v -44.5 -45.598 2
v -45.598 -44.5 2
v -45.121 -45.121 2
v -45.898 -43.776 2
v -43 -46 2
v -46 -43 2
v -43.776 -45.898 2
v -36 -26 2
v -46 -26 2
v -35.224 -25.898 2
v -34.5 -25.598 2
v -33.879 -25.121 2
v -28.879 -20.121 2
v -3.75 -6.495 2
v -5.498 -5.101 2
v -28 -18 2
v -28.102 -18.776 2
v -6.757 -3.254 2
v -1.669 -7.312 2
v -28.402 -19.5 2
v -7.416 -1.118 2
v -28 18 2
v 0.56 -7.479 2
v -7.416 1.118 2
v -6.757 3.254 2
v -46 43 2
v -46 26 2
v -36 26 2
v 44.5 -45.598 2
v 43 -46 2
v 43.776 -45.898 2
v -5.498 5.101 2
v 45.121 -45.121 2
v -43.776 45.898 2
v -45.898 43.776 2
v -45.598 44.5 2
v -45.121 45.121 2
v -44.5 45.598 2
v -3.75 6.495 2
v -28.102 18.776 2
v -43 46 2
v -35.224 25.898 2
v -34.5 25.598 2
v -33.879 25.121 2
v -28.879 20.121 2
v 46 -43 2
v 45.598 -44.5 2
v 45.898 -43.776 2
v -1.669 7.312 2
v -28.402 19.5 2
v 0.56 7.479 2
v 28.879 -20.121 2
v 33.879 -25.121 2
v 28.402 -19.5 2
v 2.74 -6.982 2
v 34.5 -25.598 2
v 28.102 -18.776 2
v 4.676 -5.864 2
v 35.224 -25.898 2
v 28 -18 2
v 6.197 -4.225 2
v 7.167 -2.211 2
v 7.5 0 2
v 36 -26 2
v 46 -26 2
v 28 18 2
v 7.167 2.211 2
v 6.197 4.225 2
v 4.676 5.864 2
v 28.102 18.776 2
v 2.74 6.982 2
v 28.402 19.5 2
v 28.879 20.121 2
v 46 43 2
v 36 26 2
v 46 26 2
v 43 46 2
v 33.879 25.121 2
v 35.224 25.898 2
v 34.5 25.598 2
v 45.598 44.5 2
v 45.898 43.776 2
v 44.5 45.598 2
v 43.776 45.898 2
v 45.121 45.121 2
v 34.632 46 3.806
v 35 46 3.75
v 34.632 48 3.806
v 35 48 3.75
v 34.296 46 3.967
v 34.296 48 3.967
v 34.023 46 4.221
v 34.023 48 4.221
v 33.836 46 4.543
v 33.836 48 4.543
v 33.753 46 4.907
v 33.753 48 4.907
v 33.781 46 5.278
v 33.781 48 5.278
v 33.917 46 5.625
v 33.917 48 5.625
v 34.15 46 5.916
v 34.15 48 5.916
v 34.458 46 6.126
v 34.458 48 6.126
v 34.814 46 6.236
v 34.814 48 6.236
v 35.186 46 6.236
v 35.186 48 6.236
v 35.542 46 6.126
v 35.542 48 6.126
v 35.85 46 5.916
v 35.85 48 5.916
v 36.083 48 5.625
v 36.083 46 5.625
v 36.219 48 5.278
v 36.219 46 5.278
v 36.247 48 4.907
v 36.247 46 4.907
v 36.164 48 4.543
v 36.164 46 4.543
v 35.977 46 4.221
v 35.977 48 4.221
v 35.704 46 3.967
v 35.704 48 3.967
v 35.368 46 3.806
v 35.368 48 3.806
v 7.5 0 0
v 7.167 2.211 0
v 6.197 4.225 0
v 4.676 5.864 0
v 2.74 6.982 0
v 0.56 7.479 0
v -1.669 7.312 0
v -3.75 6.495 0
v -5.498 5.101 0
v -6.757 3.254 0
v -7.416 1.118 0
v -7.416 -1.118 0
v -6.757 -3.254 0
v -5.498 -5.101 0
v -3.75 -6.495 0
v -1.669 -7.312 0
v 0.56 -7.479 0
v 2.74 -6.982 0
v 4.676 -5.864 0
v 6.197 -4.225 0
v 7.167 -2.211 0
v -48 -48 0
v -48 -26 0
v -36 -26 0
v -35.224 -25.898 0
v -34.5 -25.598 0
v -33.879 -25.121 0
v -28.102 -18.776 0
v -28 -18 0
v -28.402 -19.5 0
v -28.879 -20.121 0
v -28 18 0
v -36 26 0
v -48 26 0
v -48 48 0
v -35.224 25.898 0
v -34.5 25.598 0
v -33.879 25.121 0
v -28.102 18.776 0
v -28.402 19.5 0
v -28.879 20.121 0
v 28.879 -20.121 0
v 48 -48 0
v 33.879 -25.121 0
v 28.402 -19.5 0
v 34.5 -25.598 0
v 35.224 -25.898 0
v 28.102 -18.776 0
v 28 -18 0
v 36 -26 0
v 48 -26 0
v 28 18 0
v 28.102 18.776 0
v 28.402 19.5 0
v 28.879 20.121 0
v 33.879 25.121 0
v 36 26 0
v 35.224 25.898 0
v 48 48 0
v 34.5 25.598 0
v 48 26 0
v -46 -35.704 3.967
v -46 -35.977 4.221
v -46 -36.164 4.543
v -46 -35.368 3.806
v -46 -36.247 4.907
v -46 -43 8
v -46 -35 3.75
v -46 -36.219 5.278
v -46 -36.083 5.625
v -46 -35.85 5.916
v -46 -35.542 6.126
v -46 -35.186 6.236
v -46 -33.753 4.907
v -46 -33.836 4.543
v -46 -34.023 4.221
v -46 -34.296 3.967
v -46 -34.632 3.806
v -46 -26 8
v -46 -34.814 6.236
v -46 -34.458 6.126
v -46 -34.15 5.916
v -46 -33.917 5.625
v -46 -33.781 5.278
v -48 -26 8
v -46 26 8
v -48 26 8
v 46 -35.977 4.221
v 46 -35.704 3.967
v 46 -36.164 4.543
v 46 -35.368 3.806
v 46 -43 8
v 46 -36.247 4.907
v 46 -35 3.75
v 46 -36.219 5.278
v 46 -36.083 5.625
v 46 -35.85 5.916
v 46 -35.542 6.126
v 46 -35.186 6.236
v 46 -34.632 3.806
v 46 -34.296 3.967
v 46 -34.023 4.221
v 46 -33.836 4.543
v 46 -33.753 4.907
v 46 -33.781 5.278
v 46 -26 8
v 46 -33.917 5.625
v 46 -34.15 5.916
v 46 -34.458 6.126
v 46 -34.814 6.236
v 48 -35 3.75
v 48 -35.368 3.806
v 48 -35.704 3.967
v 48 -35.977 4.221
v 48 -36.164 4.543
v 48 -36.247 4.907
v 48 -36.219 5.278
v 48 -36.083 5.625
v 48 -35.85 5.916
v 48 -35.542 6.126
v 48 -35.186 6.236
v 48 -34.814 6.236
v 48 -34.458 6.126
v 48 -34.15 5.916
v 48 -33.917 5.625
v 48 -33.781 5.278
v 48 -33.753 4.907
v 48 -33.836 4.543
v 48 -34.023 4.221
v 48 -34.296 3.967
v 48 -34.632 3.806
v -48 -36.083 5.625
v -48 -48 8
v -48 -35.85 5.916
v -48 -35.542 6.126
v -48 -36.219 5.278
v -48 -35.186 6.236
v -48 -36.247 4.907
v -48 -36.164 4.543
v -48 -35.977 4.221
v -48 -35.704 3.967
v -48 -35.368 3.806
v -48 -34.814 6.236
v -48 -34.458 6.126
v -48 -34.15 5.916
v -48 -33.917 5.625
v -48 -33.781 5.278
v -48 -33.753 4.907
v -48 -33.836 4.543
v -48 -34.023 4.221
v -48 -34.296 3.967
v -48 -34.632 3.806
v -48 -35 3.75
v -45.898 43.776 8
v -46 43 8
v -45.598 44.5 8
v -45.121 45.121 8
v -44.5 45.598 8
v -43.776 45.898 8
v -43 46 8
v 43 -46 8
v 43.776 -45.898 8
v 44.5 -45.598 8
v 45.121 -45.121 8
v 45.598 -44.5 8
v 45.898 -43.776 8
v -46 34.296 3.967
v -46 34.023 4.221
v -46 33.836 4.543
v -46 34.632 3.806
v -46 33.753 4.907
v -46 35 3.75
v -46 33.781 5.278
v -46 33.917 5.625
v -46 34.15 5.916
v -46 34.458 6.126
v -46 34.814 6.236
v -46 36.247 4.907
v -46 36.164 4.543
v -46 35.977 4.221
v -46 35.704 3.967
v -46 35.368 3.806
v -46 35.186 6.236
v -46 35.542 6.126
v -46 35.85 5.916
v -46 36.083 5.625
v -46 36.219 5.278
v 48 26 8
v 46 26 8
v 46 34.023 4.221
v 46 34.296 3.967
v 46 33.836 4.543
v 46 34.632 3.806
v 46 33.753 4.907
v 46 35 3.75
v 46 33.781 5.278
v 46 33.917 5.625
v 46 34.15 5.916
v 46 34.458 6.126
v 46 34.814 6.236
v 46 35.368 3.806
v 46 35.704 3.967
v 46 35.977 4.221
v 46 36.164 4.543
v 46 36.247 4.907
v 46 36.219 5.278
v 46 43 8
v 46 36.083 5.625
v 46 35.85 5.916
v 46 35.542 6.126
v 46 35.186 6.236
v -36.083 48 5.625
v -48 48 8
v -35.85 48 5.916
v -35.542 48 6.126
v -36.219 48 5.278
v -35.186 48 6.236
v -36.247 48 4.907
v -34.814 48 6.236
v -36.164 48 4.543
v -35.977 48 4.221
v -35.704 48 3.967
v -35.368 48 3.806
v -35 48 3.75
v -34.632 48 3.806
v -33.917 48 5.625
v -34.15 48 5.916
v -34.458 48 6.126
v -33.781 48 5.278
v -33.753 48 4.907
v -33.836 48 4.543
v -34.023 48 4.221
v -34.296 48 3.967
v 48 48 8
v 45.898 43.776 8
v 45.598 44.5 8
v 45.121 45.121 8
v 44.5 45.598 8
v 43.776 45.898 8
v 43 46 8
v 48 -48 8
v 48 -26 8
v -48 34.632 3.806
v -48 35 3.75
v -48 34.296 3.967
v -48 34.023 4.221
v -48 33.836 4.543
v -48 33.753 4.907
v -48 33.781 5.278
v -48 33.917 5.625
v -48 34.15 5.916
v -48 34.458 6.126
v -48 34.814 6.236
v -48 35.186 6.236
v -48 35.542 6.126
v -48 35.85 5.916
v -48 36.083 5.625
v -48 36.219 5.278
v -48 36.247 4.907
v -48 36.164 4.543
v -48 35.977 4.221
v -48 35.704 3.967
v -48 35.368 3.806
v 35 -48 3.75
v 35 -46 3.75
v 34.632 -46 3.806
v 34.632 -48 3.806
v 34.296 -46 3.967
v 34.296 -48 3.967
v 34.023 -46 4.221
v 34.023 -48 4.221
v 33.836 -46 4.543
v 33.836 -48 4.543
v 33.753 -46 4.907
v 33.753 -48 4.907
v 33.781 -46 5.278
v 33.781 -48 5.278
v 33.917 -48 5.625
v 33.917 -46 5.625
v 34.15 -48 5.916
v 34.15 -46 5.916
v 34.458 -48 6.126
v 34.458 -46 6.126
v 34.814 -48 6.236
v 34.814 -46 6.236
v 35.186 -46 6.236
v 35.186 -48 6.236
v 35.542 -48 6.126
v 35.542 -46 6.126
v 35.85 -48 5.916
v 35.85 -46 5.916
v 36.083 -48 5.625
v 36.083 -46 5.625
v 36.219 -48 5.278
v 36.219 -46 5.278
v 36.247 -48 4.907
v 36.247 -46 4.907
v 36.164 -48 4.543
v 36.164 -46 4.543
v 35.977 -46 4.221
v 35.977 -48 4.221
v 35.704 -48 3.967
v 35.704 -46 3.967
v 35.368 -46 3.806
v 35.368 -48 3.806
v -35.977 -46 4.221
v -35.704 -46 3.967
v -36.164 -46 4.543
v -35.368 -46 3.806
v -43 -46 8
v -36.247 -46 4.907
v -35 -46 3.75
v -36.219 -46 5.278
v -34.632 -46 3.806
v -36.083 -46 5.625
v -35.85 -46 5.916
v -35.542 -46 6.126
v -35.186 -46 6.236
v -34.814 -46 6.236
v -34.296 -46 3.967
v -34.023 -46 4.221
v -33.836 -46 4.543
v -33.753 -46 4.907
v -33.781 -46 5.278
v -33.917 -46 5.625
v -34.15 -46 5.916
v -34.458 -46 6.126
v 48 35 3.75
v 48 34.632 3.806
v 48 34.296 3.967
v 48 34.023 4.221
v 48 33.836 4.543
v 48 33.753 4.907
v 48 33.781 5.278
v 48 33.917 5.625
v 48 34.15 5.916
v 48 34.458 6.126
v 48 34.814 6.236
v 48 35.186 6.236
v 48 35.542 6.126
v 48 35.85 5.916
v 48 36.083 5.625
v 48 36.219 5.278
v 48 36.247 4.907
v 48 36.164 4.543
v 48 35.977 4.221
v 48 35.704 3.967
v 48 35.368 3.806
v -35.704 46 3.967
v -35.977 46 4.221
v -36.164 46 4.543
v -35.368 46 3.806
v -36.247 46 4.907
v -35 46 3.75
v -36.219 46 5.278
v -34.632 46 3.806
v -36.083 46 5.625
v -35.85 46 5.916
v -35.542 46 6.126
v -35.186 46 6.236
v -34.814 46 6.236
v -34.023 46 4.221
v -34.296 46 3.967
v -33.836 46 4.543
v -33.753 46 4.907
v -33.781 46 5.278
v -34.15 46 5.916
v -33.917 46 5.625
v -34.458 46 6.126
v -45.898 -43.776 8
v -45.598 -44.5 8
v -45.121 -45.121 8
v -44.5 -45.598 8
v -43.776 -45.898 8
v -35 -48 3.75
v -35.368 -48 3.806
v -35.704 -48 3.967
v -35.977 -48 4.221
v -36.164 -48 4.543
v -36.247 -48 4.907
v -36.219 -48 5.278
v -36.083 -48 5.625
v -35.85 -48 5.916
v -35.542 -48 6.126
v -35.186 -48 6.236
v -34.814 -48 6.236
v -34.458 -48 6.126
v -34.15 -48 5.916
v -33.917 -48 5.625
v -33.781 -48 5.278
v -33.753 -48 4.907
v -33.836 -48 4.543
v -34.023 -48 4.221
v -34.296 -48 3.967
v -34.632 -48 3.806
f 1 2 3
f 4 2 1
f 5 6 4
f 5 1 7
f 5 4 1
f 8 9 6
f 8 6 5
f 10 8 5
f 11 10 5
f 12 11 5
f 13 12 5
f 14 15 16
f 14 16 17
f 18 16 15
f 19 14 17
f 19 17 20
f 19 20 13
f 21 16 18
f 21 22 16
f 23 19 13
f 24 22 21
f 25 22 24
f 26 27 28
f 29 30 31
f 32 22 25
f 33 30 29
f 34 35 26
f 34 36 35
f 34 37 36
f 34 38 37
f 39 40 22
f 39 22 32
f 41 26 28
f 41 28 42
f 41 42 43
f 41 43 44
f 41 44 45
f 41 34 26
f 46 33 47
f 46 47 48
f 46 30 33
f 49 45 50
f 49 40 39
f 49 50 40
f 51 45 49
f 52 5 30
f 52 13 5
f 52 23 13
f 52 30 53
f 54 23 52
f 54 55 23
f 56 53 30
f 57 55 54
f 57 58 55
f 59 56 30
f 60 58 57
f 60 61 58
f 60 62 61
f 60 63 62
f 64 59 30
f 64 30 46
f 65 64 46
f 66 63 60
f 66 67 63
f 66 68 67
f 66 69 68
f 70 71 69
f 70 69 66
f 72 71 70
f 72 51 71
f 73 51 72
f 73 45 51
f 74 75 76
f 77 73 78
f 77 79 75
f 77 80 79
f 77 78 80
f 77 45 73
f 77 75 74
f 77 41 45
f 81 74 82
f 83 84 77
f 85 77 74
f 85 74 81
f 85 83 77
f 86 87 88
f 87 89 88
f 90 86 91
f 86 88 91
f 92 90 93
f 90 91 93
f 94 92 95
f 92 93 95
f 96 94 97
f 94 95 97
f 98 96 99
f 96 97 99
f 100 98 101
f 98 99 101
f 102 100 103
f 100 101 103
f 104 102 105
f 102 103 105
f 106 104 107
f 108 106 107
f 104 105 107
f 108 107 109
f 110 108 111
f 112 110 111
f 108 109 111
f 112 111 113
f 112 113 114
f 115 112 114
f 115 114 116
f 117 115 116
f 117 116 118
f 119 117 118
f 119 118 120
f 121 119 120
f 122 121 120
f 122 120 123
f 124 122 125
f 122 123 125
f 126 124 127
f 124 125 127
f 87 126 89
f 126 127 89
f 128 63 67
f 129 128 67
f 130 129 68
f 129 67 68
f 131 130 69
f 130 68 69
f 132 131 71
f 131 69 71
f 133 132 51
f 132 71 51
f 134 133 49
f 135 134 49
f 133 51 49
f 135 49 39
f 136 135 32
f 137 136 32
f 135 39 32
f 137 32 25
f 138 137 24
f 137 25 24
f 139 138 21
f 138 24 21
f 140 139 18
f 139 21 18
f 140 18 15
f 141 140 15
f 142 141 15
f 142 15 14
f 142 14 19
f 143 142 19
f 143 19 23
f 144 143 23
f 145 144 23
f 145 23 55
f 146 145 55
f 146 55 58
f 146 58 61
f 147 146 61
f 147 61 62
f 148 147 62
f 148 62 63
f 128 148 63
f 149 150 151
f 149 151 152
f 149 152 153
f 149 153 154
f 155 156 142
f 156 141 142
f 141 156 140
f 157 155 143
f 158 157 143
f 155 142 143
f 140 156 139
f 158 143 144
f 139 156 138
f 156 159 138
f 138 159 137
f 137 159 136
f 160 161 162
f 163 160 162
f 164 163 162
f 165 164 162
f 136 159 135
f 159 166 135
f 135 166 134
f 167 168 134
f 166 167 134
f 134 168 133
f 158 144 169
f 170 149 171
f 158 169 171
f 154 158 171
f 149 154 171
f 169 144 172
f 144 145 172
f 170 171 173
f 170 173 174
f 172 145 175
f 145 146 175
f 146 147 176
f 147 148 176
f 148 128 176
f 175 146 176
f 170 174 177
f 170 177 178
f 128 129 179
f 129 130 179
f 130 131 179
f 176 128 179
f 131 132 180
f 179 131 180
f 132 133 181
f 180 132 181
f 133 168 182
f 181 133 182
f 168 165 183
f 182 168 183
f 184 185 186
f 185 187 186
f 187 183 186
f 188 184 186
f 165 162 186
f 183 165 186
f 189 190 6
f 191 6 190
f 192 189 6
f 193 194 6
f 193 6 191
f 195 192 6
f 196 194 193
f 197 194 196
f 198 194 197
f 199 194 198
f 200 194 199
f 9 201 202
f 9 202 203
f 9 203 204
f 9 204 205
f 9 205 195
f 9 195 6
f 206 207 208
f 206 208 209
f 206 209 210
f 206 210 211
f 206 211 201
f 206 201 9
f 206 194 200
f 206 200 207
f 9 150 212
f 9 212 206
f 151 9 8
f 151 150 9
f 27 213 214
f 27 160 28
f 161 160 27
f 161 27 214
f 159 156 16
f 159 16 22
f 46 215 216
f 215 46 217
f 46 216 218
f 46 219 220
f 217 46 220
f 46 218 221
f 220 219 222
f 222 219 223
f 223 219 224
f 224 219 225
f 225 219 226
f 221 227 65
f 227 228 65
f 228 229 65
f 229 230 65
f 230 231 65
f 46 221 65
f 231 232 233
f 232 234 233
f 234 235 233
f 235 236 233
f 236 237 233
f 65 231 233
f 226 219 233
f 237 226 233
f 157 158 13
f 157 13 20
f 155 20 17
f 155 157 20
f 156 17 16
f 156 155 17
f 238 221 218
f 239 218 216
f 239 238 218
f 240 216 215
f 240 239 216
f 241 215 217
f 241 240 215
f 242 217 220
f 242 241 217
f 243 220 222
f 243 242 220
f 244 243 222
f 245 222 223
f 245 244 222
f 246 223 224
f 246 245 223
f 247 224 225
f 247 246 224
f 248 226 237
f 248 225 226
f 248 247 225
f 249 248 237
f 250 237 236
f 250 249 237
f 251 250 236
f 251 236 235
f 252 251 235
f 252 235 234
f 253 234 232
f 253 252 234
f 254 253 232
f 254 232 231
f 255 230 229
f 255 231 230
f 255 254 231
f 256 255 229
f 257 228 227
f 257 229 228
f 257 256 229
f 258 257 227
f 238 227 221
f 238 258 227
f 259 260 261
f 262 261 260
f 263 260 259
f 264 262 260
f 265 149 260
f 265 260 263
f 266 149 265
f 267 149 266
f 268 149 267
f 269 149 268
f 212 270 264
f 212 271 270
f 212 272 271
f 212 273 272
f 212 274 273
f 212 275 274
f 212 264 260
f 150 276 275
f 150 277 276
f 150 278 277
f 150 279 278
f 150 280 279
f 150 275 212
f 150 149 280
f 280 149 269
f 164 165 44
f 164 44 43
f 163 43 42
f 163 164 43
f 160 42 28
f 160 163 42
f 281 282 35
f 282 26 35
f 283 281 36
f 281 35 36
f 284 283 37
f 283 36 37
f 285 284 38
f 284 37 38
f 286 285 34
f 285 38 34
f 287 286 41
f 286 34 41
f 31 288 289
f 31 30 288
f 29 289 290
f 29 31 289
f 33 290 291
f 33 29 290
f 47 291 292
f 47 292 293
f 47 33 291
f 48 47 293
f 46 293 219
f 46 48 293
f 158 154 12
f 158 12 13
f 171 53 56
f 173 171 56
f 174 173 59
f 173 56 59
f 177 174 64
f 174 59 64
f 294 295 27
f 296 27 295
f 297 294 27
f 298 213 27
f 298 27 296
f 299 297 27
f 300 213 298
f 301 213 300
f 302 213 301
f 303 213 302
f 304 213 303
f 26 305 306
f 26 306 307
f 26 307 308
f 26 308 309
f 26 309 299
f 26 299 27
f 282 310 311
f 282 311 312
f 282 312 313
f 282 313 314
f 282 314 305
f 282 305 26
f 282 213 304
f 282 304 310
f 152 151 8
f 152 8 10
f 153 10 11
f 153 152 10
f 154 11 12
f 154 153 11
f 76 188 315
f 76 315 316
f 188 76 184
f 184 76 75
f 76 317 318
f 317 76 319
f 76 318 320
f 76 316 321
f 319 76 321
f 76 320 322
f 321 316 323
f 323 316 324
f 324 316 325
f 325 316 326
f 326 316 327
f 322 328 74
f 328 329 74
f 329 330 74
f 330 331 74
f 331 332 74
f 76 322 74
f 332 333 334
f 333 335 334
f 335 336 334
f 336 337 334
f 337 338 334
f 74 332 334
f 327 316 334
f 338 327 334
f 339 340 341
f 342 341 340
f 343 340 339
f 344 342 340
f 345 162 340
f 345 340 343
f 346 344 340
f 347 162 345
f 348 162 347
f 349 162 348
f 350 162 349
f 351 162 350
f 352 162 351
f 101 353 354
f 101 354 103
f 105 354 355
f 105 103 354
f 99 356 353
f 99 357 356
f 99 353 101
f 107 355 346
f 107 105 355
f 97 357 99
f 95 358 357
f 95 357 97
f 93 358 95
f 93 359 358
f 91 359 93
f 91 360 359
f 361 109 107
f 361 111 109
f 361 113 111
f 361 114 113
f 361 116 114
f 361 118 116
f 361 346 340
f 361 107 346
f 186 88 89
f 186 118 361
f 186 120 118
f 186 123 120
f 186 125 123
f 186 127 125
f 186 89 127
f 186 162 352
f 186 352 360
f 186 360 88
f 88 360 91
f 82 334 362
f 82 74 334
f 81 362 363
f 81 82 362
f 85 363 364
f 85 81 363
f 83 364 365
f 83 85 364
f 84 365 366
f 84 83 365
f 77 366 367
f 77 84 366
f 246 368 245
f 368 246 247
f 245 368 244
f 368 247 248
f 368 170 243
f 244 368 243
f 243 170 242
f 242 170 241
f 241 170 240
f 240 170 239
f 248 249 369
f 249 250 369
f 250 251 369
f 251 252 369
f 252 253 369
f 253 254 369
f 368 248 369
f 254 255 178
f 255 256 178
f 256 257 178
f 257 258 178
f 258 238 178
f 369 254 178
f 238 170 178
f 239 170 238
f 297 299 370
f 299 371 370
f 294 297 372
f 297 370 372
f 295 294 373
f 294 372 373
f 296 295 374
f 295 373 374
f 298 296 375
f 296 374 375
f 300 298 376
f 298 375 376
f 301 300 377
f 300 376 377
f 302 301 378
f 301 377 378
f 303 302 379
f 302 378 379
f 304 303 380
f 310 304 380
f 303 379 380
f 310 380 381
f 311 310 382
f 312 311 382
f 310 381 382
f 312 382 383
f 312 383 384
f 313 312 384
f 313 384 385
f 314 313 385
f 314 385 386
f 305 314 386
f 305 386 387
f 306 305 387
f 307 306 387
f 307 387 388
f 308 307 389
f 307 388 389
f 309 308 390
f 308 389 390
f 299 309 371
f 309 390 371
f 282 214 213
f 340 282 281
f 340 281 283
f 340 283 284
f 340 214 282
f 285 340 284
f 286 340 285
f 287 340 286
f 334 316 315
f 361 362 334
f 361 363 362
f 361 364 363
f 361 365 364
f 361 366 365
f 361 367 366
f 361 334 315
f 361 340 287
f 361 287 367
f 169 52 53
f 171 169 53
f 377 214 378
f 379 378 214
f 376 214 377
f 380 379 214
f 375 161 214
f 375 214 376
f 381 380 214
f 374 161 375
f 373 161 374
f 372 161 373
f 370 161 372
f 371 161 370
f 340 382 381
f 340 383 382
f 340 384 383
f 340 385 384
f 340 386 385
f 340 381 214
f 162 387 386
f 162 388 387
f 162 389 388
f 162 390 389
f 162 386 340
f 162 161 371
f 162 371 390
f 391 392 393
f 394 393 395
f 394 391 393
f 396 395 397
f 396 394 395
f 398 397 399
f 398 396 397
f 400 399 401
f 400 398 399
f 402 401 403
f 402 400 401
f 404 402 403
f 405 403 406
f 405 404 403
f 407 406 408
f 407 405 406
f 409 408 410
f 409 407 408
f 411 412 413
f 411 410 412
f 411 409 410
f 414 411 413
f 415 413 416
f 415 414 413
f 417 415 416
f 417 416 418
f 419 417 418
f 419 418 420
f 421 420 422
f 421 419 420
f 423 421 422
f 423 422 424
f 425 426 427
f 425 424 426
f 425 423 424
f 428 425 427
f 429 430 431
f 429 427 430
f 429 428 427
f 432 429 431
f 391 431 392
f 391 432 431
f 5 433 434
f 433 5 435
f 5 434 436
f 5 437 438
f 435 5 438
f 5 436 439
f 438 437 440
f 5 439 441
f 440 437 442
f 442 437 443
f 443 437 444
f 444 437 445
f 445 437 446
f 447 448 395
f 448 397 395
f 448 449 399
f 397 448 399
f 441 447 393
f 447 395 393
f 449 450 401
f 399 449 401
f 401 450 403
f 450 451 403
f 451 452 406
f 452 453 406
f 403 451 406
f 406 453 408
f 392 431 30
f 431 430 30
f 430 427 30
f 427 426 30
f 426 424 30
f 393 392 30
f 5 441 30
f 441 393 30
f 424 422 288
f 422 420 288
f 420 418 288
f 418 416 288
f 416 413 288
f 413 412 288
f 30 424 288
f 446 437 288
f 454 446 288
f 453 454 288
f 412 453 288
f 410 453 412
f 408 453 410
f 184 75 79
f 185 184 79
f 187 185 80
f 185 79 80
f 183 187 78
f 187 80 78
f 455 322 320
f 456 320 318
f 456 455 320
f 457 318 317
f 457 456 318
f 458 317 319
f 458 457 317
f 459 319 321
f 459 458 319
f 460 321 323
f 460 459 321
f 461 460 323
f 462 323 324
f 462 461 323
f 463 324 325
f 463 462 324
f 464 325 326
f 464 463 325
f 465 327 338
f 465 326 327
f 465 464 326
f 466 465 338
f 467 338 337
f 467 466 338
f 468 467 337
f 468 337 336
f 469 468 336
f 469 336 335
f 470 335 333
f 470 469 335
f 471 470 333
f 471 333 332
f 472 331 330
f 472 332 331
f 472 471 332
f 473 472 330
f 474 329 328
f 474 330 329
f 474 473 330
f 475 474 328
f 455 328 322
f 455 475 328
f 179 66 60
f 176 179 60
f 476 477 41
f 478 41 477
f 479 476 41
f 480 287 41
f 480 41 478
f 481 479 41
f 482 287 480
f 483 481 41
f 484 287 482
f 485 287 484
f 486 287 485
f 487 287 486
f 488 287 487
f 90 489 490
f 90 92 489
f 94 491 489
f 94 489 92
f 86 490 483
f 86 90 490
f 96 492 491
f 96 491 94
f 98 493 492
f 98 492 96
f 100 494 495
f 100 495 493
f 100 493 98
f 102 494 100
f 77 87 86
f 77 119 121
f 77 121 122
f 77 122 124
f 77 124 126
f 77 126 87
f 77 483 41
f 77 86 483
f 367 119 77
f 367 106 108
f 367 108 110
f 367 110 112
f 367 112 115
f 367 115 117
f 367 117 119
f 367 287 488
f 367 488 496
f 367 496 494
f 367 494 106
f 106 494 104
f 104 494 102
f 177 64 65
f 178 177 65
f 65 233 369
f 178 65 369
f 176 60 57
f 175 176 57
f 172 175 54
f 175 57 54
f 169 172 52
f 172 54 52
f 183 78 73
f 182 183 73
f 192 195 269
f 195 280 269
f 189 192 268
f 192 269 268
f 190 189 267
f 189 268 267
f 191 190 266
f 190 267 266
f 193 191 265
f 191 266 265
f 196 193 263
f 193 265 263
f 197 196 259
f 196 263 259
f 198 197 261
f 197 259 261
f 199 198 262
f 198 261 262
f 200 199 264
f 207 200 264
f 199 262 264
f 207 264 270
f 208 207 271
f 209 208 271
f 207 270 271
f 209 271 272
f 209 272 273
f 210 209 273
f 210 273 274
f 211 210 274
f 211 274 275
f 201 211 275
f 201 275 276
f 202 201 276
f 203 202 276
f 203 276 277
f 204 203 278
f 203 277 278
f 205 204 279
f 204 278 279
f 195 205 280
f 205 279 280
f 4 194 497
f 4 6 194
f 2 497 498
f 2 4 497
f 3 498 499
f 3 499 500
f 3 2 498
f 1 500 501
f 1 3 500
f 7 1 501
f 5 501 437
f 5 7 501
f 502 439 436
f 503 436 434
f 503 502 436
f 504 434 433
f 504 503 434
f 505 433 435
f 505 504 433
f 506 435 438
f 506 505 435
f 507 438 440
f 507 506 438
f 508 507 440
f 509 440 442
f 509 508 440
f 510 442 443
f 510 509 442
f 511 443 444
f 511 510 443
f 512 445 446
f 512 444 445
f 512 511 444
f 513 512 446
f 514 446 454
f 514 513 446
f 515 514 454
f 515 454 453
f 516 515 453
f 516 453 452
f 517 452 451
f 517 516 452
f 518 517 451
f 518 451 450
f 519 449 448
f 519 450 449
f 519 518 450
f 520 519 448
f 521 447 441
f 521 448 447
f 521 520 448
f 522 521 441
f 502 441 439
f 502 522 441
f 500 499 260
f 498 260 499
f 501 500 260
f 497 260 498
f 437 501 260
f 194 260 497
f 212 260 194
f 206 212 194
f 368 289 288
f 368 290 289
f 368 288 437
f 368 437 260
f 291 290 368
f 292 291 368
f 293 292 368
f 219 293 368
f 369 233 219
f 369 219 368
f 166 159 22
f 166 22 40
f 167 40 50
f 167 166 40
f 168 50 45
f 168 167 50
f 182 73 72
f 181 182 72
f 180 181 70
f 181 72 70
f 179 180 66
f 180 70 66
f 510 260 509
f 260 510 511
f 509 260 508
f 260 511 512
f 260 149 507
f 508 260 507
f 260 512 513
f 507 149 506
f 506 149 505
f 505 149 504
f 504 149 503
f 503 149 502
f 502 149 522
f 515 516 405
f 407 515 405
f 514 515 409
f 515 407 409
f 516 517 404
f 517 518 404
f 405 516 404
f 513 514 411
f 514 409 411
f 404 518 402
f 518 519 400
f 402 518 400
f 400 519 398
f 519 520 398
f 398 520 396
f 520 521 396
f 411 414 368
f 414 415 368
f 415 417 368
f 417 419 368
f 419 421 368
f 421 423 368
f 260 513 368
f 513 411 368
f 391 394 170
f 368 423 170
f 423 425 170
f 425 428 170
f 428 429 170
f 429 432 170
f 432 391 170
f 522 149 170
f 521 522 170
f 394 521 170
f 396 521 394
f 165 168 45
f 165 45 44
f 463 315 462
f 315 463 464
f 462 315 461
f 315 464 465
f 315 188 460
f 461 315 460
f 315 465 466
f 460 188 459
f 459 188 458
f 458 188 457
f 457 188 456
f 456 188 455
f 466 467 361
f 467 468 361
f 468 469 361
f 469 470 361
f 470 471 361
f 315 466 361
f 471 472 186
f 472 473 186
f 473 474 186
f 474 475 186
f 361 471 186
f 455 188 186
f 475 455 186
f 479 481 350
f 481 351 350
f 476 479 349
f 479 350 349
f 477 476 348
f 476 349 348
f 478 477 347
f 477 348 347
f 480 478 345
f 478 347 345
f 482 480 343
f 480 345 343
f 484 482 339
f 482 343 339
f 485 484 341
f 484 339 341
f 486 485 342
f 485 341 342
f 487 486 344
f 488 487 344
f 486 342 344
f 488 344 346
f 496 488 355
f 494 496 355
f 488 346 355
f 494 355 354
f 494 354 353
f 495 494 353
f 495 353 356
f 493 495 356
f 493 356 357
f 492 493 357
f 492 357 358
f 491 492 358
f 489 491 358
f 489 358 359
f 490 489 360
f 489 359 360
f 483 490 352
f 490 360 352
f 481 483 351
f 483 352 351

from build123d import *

# Parameters (mm, degrees)
SKETCH1_W                      = 96
SKETCH1_H                      = 96
BOSS_EXTRUDE1_DEPTH            = 8
SKETCH2_W                      = 92
SKETCH2_H                      = 92
COMPONENT_PLATFORM_DEPTH       = 6
CABLE_SLOTS_DEPTH              = 6
SKETCH4_R                      = 7.5
CENTER_MASS_CUT_DEPTH          = 6
INNER_CORNER_FILLETS_R         = 3
M3X0_5_TAPPED_HOLE1_AT_2_COUNT = 2
M3X0_5_TAPPED_HOLE1_AT_2_PITCH = 70
M3X0_5_TAPPED_HOLE2_AT_2_COUNT = 2
M3X0_5_TAPPED_HOLE2_AT_2_PITCH = 70


with BuildPart() as part:
    # Sketch1 → Boss-Extrude1 (new body)
    with BuildSketch(Plane.XY):
        Rectangle(SKETCH1_W, SKETCH1_H)
    extrude(amount=BOSS_EXTRUDE1_DEPTH)

    # Sketch2 → Component Platform (cut)
    with BuildSketch(Plane.XY.offset(8)):
        Rectangle(SKETCH2_W, SKETCH2_H)
    extrude(amount=-COMPONENT_PLATFORM_DEPTH, mode=Mode.SUBTRACT)

    # Sketch3 → Cable Slots (cut, symmetric)
    with BuildSketch(Plane.XY.offset(2)):
        with BuildLine():
            Line((-33.878679656, -25.121320344), (-28.878679656, -20.121320344))
            ThreePointArc((-28.878679656, -20.121320344), (-28.228361402, -19.148050297), (-28, -18))
            Line((-28, -18), (-28, 18))
            ThreePointArc((-28, 18), (-28.228361402, 19.148050297), (-28.878679656, 20.121320344))
            Line((-28.878679656, 20.121320344), (-33.878679656, 25.121320344))
            ThreePointArc((-33.878679656, 25.121320344), (-34.851949703, 25.771638598), (-36, 26))
            Line((-36, 26), (-48, 26))
            Line((-48, 26), (-48, -26))
            Line((-48, -26), (-36, -26))
            ThreePointArc((-36, -26), (-34.851949703, -25.771638598), (-33.878679656, -25.121320344))
        make_face()
        with BuildLine():
            Line((48, -26), (48, 26))
            Line((48, 26), (36, 26))
            ThreePointArc((36, 26), (34.851949703, 25.771638598), (33.878679656, 25.121320344))
            Line((33.878679656, 25.121320344), (28.878679656, 20.121320344))
            ThreePointArc((28.878679656, 20.121320344), (28.228361402, 19.148050297), (28, 18))
            Line((28, 18), (28, -18))
            ThreePointArc((28, -18), (28.228361402, -19.148050297), (28.878679656, -20.121320344))
            Line((28.878679656, -20.121320344), (33.878679656, -25.121320344))
            ThreePointArc((33.878679656, -25.121320344), (34.851949703, -25.771638598), (36, -26))
            Line((36, -26), (48, -26))
        make_face()
    extrude(amount=CABLE_SLOTS_DEPTH, both=True, mode=Mode.SUBTRACT)

    # Sketch4 → Center Mass Cut (cut)
    with BuildSketch(Plane.XY.offset(2)):
        Circle(SKETCH4_R)
    extrude(amount=-CENTER_MASS_CUT_DEPTH, mode=Mode.SUBTRACT)

    # Inner Corner Fillets
    inner_corner_fillets_edges = [part.edges().sort_by_distance(p)[0] for p in [
        (-46, -46, 5),
        (-46, 46, 5),
        (46, 46, 5),
        (46, -46, 5),
    ]]
    fillet(inner_corner_fillets_edges, radius=INNER_CORNER_FILLETS_R)

    # Sketch10 → M3x0.5 Tapped Hole1 (revolve, cut)
    with BuildSketch(Plane(origin=(48, -35, 5), x_dir=(0, 0, -1), z_dir=(0, 1, 0))):
        Polygon((0, 0), (0, 10.751075774), (1.25, 10), (1.25, 0), align=None)
    m3x0_5_tapped_hole1 = revolve(axis=Axis((54.35, -35, 5), (-1, 0, 0)), mode=Mode.SUBTRACT)

    # M3x0.5 Tapped Hole1 at 2: M3x0.5 Tapped Hole1 ×2
    with Locations(*[(0, i * M3X0_5_TAPPED_HOLE1_AT_2_PITCH, 0) for i in range(1, M3X0_5_TAPPED_HOLE1_AT_2_COUNT)]):
        add(m3x0_5_tapped_hole1, mode=Mode.SUBTRACT)

    # Sketch13 → M3x0.5 Tapped Hole2 (revolve, cut)
    with BuildSketch(Plane(origin=(-35, -48, 5), x_dir=(0, 0, -1), z_dir=(1, 0, 0))):
        Polygon((0, 0), (0, 10.751075774), (1.25, 10), (1.25, 0), align=None)
    m3x0_5_tapped_hole2 = revolve(axis=Axis((-35, -54.35, 5), (0, 1, 0)), mode=Mode.SUBTRACT)

    # M3x0.5 Tapped Hole2 at 2: M3x0.5 Tapped Hole2 ×2
    with Locations(*[(i * M3X0_5_TAPPED_HOLE2_AT_2_PITCH, 0, 0) for i in range(1, M3X0_5_TAPPED_HOLE2_AT_2_COUNT)]):
        add(m3x0_5_tapped_hole2, mode=Mode.SUBTRACT)

    # Mirror1: M3x0.5 Tapped Hole1 across plane
    add(m3x0_5_tapped_hole1.mirror(Plane(origin=(0, 0, 0), x_dir=(0, 0, 1), z_dir=(1, 0, 0))), mode=Mode.SUBTRACT)

    # Mirror1 copy 1 sketch → Mirror1 copy 1 (revolve, cut)
    with BuildSketch(Plane(origin=(-48, 35, 5), x_dir=(0, 0, -1), z_dir=(0, 1, 0))):
        Polygon((0, 0), (0, -10.751075774), (1.25, -10), (1.25, 0), align=None)
    revolve(axis=Axis((-54.35, 35, 5), (-1, 0, 0)), mode=Mode.SUBTRACT)

    # Mirror2: M3x0.5 Tapped Hole2 across plane
    add(m3x0_5_tapped_hole2.mirror(Plane(origin=(0, 0, 0), x_dir=(0, 0, 1), z_dir=(0, -1, 0))), mode=Mode.SUBTRACT)

    # Mirror2 copy 1 sketch → Mirror2 copy 1 (revolve, cut)
    with BuildSketch(Plane(origin=(35, 48, 5), x_dir=(0, 0, -1), z_dir=(1, 0, 0))):
        Polygon((0, 0), (0, -10.751075774), (1.25, -10), (1.25, 0), align=None)
    revolve(axis=Axis((35, 54.35, 5), (0, 1, 0)), mode=Mode.SUBTRACT)


solid = part.part
